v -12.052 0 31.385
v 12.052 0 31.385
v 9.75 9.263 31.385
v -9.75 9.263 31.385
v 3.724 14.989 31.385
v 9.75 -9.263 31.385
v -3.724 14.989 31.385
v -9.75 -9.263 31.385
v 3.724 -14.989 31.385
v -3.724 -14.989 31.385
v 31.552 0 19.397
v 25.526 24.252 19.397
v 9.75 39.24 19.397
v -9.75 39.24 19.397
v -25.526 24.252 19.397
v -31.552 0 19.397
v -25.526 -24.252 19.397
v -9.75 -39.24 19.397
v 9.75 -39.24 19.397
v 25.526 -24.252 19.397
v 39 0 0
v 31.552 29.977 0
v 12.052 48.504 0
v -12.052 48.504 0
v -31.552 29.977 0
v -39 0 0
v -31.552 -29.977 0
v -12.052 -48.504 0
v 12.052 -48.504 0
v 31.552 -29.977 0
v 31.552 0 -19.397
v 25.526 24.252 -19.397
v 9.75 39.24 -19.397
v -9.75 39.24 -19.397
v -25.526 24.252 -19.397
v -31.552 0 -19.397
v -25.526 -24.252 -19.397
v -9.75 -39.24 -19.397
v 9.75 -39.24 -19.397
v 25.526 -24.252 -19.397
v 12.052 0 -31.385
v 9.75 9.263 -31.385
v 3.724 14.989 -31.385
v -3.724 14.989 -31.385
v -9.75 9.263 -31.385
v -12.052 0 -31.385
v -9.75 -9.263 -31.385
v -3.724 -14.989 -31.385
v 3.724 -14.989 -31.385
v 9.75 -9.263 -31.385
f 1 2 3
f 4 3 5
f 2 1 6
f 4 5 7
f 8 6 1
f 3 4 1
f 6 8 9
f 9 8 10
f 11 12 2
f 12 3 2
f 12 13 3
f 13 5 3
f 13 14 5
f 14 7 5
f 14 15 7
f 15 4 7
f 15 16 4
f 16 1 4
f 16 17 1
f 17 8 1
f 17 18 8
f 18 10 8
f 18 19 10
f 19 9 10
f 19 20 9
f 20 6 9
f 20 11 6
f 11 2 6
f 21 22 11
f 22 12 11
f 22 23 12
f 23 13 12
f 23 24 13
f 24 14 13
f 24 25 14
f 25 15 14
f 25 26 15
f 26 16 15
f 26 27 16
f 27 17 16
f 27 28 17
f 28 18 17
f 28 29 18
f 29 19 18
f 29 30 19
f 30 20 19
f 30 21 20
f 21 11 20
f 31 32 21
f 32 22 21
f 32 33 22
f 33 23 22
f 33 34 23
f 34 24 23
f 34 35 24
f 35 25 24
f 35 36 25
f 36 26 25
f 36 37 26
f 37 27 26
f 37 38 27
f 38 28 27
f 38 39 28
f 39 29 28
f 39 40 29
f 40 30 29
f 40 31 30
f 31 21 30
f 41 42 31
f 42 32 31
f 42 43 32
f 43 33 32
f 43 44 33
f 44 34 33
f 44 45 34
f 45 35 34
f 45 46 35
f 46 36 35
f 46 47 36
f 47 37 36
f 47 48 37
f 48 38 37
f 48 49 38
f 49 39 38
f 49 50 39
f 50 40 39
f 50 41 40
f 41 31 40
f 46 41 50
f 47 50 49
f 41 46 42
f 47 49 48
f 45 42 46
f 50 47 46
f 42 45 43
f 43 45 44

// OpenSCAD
// Generated by SolidPython 1.0.1 on 2020-07-29 00:46:51


scale(v = [13, 17, 11]) {
	sphere(r = 3);
}
/***********************************************
*********      SolidPython code:      **********
************************************************
 
# import packages: SolidPython
from solid import *
from solid.utils import *
from itertools import chain, combinations, permutations


class Resize:

    def __init__(self, scad_file):
        self.scad_file = scad_file
        #self.scad_file = import_scad(scad_file)
        # cone/cylinder param:
        self.r1 = 0
        self.r2 = 0
        self.h = 0
        # rectangular prism param:
        self.w = 0
        self.l = 0
        # ellipse param:
        self.r = 0

    # import OpenScad code (file name corresponds to shape)


    # classify shape + parameters
    def assign(self, param1, param2, param3):
        if self.scad_file == 'cone.scad':
            self.r1 = param1
            self.r2 = param2
            self.h = param3
        elif self.scad_file == 'cylinder.scad':
            self.r1 = param1
            self.r2 = param2
            self.h = param3
        elif self.scad_file == 'rectangularPrism.scad':
            self.h = param1
            self.l = param2
            self.w = param3
        else:
            self.r = param1
            self.h = param2

    # resize parameters
    def iterate(self):
        x = range(3, 20, 2)
        i = 1
        if self.scad_file == 'cone.scad':
            tempList = list(permutations(x, 2))
            for temp in tempList:
                param1 = temp[0]
                param2 = temp[1]
                filepath = 'produced_scad_files/' + 'cone' + str(param1) + '_' + str(param2) + '_' + '.scad'
                scad_render_to_file(cylinder(h=param1, r1=param2, r2=0), filepath)

        elif self.scad_file == 'cylinder.scad':
            tempList = list(permutations(x, 3))
            for temp in tempList:
                param1 = temp[0]
                param2 = temp[1]
                filepath = 'produced_scad_files/' + 'cylinder' + str(param1) + '_' + str(param2) + '_' + '.scad'
                scad_render_to_file(cylinder(h=param1, r1=param2, r2=param2), filepath)

        elif self.scad_file == 'rectangularPrism.scad':
            tempList = list(permutations(x, 3))
            for temp in tempList:
                param1 = temp[0]
                param2 = temp[1]
                param3 = temp[2]
                filepath = 'produced_scad_files/' + 'rectangularPrism' + str(param1) + '_' + str(param2) + '_' + str(
                    param3) + '.scad'
                scad_render_to_file(cube(size=(param1, param2, param3)), filepath)

        elif self.scad_file == 'ellipse.scad':
            tempList = list(permutations(x, 4))
            for temp in tempList:
                param1 = temp[0]
                param2 = temp[1]
                param3 = temp[2]
                param4 = temp[3]
                filepath = 'produced_scad_files/' + 'ellipse' + str(param1) + '_' + str(param2) + '_' + str(param3) + '_' + str(param4) + '.scad'
                scad_render_to_file(scale([param1, param2, param3])(sphere(r=param4)), filepath)

    def render_to_scadfile(self):
        scad_render_to_file(scad, 'example.scad') 
 
************************************************/
